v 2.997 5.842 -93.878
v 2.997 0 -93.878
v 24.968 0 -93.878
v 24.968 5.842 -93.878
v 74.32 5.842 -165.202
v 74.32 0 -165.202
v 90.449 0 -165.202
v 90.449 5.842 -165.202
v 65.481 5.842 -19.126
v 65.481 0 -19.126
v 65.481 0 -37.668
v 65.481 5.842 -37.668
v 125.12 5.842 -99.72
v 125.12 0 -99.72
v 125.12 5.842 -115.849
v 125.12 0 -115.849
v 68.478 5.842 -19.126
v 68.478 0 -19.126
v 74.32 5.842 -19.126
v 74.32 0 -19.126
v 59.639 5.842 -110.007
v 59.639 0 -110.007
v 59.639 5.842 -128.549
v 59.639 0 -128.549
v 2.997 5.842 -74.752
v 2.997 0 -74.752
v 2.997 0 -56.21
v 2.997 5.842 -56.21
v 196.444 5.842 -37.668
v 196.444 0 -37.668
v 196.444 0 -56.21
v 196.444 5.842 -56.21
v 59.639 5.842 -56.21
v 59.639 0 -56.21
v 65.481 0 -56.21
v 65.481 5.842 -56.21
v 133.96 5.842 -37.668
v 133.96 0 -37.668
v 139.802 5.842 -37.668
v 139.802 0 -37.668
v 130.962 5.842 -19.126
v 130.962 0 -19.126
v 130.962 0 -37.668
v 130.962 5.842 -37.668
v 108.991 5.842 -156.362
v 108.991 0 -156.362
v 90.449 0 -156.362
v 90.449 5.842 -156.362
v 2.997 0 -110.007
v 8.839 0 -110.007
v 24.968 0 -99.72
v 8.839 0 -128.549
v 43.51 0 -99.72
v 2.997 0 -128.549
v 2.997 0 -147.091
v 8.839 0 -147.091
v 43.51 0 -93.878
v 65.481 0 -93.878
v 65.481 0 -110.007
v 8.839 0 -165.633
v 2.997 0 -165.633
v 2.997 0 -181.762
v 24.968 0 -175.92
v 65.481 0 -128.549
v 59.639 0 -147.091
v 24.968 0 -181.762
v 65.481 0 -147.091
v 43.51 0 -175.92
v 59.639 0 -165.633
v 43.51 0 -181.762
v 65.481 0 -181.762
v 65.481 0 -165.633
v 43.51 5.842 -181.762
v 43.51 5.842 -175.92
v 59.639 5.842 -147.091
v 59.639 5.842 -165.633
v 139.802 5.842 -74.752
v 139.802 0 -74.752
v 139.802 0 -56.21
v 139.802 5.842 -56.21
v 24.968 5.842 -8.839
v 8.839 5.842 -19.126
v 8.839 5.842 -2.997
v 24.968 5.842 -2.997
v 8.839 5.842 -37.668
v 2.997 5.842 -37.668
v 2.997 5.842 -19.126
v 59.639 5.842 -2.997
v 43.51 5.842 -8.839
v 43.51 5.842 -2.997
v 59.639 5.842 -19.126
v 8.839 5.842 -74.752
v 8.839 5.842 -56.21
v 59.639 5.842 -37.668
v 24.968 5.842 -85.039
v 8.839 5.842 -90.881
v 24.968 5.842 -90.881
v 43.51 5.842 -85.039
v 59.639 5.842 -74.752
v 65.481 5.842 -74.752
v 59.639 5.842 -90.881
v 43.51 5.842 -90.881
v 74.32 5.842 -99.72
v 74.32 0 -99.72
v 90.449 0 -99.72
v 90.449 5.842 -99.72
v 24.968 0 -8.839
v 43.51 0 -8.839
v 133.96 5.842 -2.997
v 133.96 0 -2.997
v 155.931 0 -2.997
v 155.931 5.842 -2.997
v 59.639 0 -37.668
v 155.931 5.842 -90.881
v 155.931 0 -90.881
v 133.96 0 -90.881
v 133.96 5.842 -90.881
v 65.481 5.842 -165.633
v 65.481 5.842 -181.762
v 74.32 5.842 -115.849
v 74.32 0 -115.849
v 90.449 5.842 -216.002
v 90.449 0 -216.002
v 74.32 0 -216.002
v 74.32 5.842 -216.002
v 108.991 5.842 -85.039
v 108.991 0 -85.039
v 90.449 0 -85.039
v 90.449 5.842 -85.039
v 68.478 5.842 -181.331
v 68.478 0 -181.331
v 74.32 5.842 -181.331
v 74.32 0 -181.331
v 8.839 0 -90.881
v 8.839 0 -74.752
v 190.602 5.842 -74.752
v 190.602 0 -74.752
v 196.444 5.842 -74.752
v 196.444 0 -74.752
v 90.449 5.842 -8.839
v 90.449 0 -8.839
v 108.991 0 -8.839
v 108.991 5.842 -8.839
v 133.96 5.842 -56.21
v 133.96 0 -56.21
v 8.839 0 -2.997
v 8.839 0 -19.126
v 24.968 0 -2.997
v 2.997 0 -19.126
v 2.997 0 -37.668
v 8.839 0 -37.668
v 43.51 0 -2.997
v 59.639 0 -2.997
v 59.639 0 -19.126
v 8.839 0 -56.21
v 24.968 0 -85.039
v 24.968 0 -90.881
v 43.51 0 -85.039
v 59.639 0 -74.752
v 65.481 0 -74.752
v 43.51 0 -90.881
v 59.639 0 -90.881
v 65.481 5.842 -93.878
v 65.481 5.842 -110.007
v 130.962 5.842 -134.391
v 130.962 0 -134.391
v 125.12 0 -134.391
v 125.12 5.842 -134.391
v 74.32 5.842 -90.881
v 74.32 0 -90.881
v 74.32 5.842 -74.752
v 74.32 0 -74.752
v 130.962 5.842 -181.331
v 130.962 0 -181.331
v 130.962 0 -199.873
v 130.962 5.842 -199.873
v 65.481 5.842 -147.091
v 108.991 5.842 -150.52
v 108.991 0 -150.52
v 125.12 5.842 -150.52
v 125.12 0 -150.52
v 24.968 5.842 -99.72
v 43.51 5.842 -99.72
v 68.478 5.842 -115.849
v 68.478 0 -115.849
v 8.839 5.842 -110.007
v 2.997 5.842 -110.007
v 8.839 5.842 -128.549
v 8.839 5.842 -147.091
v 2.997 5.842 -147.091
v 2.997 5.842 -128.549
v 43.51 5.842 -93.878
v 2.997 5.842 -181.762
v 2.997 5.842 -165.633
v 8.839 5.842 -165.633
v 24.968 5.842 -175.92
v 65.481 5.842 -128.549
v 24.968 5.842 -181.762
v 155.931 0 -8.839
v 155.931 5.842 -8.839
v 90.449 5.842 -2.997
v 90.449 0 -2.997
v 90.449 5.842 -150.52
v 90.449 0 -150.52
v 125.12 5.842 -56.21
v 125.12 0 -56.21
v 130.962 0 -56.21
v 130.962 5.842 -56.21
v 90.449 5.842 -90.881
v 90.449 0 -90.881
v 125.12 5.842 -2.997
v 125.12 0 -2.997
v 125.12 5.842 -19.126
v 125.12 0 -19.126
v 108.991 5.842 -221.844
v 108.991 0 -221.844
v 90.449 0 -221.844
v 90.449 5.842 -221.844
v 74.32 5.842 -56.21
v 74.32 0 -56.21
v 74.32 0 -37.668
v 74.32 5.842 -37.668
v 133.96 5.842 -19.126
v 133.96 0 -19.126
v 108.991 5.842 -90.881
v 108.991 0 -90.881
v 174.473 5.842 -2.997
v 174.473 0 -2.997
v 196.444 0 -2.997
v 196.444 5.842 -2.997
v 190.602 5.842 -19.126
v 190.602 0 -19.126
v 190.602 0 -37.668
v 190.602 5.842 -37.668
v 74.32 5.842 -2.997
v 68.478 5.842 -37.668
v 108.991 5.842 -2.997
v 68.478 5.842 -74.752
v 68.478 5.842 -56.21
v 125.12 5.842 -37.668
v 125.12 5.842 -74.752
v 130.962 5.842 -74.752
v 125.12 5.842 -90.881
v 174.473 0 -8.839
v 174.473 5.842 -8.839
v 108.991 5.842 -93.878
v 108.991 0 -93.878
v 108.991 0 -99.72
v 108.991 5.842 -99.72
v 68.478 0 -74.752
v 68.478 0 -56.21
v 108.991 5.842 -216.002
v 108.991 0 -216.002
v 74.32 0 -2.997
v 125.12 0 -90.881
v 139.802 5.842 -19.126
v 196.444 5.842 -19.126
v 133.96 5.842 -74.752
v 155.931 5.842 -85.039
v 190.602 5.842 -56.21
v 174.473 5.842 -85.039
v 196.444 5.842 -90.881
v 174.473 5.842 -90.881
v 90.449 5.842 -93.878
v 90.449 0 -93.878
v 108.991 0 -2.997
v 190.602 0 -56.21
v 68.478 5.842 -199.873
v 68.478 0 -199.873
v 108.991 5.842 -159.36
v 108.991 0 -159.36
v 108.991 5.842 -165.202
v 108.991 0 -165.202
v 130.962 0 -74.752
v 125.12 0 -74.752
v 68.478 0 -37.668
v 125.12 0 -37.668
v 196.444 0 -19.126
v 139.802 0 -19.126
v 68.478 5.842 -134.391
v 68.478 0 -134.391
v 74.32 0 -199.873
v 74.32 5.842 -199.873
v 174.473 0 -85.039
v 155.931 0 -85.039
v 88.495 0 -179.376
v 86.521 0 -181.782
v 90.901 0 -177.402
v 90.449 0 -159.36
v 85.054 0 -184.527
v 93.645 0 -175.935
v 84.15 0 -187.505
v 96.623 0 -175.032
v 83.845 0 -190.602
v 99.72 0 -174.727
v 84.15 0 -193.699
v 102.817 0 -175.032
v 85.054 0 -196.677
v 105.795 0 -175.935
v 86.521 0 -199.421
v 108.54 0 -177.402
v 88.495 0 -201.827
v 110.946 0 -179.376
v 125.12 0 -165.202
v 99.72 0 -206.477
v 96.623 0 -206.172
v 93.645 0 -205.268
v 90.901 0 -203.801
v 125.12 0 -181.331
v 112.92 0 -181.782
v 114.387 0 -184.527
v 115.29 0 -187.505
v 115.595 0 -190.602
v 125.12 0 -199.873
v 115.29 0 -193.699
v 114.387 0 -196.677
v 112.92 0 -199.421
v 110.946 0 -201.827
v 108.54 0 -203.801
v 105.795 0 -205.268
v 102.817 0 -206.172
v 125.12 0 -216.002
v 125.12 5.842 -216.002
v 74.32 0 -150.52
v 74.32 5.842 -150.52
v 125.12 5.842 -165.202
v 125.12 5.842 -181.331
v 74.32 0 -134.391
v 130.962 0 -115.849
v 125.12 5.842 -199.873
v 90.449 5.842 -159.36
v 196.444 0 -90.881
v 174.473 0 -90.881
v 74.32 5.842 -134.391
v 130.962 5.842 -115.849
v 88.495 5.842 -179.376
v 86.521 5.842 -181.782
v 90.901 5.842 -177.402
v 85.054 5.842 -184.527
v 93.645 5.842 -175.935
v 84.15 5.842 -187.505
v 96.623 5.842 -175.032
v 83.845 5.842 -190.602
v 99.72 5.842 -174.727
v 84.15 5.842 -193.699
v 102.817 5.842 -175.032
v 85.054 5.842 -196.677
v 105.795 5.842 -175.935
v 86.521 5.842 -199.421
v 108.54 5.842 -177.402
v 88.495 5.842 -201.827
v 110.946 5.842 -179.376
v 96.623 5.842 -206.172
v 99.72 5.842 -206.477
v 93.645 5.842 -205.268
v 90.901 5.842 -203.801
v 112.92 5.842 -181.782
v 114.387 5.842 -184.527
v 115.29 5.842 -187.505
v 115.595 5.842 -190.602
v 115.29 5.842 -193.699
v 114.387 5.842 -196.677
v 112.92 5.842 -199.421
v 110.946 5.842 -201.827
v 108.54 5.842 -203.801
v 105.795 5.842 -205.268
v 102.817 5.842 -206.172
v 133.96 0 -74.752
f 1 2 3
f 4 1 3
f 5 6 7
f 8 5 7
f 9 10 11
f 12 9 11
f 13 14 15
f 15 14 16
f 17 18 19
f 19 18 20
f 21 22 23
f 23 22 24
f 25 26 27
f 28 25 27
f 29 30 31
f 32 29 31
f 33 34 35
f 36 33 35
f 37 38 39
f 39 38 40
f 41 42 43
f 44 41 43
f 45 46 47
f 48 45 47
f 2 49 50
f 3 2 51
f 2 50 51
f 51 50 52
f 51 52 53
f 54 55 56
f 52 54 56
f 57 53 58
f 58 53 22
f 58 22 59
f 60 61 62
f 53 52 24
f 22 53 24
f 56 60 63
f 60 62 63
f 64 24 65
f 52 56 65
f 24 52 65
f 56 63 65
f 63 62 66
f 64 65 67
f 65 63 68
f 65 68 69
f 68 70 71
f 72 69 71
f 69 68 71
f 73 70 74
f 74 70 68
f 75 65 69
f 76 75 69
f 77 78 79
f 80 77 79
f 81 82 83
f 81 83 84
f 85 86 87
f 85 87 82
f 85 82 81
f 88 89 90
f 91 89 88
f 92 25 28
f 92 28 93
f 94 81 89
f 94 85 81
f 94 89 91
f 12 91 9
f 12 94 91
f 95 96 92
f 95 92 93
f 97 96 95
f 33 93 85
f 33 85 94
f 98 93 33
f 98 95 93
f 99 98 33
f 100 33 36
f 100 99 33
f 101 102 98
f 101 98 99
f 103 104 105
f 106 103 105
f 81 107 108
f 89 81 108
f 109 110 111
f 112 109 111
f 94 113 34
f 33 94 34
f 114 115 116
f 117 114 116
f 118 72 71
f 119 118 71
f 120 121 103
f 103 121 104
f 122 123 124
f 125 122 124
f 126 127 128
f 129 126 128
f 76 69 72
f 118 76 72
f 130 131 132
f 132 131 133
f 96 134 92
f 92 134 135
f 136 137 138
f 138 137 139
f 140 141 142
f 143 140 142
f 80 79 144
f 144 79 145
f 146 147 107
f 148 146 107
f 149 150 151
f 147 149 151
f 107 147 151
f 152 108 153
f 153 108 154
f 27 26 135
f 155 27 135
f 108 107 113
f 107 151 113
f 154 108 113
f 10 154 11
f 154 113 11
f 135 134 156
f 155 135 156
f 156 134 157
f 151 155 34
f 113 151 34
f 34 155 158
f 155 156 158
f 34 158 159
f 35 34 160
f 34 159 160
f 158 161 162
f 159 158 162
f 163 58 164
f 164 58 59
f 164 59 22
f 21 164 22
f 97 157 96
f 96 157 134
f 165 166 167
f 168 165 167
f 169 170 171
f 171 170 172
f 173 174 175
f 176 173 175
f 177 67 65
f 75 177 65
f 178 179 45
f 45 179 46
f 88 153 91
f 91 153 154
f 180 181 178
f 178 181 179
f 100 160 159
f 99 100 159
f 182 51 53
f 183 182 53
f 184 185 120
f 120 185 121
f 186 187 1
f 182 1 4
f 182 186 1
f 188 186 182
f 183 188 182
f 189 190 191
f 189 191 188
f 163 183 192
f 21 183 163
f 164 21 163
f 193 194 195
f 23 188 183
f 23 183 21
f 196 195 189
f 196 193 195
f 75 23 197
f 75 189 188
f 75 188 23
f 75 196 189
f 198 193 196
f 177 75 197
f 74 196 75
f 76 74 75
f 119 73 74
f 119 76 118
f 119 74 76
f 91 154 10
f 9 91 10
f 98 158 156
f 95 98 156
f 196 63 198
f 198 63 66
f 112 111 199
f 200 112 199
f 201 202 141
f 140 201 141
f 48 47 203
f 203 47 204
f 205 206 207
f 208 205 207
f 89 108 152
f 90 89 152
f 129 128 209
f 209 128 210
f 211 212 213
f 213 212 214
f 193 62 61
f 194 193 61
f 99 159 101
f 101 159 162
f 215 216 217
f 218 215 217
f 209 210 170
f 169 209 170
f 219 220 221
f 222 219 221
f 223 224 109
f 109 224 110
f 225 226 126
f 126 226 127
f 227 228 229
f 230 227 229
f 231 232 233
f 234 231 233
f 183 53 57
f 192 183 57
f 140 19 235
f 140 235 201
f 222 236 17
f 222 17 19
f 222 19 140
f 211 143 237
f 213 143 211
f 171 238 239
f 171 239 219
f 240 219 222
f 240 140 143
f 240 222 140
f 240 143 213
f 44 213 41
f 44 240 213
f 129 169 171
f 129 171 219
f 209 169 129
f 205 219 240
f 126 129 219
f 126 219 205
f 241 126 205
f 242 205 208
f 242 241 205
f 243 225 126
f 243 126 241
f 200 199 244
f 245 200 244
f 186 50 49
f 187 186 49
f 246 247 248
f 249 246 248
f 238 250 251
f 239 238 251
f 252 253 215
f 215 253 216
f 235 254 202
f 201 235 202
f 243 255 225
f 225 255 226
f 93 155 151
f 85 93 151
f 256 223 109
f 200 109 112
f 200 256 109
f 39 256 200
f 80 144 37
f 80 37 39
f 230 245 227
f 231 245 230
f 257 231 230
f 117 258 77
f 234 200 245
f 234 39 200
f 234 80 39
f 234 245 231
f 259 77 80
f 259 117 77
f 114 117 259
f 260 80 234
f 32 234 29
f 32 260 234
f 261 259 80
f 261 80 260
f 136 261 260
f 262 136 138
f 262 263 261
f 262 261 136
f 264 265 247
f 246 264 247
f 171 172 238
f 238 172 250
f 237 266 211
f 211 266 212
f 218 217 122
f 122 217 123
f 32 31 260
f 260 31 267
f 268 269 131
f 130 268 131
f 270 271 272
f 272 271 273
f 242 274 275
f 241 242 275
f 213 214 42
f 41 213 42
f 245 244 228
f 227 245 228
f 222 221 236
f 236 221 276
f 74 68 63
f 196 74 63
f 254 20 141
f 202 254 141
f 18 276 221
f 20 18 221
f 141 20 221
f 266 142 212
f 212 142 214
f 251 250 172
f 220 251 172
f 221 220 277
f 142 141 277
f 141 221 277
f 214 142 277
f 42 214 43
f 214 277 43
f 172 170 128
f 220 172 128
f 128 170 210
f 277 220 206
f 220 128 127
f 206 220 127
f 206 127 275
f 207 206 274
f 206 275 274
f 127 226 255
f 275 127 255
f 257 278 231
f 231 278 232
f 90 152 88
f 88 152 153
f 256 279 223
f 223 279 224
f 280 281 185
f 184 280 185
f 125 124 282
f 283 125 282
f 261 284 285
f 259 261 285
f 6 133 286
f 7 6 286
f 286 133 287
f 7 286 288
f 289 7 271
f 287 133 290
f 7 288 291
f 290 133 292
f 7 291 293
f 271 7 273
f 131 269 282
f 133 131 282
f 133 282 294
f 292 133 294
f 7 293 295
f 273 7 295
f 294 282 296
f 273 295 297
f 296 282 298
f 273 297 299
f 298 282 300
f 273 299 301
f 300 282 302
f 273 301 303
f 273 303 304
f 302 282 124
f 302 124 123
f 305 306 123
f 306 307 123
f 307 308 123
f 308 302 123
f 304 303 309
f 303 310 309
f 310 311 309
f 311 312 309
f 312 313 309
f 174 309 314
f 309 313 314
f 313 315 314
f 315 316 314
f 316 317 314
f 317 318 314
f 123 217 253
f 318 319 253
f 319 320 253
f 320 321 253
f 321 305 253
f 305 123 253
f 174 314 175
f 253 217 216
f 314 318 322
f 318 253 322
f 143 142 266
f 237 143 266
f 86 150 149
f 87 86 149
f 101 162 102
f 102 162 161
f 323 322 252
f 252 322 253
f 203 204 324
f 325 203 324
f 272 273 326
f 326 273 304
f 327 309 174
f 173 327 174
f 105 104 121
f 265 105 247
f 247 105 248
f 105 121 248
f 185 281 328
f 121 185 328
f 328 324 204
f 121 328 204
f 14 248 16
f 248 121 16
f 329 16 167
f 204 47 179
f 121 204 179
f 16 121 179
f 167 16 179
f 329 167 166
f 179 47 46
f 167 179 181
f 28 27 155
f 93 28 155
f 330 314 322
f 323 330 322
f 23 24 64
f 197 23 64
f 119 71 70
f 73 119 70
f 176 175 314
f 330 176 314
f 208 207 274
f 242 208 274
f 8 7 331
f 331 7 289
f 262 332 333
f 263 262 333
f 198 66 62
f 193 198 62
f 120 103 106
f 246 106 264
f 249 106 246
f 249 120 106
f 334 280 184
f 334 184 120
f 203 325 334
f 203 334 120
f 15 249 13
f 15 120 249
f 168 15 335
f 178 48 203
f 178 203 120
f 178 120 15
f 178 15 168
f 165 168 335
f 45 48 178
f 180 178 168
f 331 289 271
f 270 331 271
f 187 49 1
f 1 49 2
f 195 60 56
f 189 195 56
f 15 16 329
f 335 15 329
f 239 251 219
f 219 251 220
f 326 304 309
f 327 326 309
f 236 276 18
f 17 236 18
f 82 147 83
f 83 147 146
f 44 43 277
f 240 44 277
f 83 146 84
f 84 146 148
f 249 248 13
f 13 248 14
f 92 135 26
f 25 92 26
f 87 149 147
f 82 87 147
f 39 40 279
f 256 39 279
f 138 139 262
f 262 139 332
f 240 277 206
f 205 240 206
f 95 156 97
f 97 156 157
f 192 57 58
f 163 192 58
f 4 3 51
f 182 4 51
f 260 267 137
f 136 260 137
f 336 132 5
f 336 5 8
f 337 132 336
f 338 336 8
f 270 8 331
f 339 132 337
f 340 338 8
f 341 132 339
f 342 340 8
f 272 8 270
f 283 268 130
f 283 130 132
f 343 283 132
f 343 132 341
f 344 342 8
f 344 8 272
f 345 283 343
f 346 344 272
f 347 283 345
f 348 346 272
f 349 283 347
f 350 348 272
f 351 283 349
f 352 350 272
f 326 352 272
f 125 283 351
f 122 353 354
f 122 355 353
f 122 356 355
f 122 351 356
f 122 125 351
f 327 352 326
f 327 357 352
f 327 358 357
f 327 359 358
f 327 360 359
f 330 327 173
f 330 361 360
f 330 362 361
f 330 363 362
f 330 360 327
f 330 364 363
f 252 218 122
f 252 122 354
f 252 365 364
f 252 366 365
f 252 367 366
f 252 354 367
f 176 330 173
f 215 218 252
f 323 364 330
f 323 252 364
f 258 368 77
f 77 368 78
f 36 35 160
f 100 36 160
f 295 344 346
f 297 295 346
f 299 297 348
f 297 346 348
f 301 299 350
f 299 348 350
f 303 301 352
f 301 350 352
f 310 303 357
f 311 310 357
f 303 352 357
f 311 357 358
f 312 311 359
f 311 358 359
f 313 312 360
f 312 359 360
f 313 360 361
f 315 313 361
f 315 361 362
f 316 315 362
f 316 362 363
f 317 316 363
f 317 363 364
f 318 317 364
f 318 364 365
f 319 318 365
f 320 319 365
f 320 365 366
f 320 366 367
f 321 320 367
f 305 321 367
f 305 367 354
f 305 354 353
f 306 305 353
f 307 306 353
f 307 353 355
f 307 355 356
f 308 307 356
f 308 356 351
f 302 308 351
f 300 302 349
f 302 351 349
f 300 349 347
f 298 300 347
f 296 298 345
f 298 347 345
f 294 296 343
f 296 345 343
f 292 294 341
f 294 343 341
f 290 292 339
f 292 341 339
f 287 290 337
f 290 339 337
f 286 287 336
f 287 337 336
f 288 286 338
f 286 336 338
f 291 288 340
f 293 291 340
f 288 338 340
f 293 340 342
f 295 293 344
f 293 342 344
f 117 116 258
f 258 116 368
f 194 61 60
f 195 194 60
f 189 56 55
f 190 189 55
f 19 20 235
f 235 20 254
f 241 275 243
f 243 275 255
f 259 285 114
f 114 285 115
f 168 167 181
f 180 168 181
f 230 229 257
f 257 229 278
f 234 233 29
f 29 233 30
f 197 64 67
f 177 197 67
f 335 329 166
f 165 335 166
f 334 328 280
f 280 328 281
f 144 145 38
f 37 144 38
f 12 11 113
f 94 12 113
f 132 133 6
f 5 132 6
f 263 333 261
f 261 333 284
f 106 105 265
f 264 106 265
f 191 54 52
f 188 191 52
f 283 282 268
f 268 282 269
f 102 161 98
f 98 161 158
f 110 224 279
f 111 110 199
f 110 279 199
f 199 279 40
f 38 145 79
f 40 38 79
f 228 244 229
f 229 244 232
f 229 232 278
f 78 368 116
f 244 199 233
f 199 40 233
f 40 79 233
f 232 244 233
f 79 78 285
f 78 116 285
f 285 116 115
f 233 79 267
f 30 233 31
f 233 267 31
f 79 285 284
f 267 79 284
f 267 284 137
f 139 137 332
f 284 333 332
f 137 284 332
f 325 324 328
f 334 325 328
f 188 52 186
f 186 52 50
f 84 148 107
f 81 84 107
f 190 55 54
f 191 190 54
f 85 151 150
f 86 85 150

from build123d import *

# Parameters (mm, degrees)
BOSS_EXTRUDE1_DEPTH   = 5.842
BOSS_EXTRUDE1_2_DEPTH = 5.842
BOSS_EXTRUDE1_3_DEPTH = 5.842
BOSS_EXTRUDE1_4_DEPTH = 5.842
BOSS_EXTRUDE1_5_DEPTH = 5.842
BOSS_EXTRUDE1_6_DEPTH = 5.842
SKETCH5_R             = 15.875
CUT_EXTRUDE1_DEPTH    = 297.37611207


with BuildPart() as part:
    # Sketch4 → Boss-Extrude1 (new body)
    with BuildSketch(Plane(origin=(0, 0, 0), x_dir=(1, 0, 0), z_dir=(0, 1, 0))):
        Polygon((43.5102, 181.7624), (43.5102, 175.9204), (24.9682, 175.9204), (24.9682, 181.7624), (8.8392, 181.7624), (2.9972, 181.7624), (2.9972, 175.9204), (2.9972, 165.6334), (8.8392, 165.6334), (8.8392, 147.0914), (2.9972, 147.0914), (2.9972, 128.5494), (8.8392, 128.5494), (8.8392, 110.0074), (2.9972, 110.0074), (2.9972, 99.7204), (2.9972, 93.8784), (8.8392, 93.8784), (24.9682, 93.8784), (24.9682, 99.7204), (43.5102, 99.7204), (43.5102, 93.8784), (59.6392, 93.8784), (65.4812, 93.8784), (65.4812, 99.7204), (65.4812, 110.0074), (59.6392, 110.0074), (59.6392, 128.5494), (65.4812, 128.5494), (65.4812, 147.0914), (59.6392, 147.0914), (59.6392, 165.6334), (65.4812, 165.6334), (65.4812, 175.9204), (65.4812, 181.7624), (59.6392, 181.7624), align=None)
    extrude(amount=BOSS_EXTRUDE1_DEPTH)


with BuildPart() as body_2:
    # Sketch4 → Boss-Extrude1 2 (new body)
    with BuildSketch(Plane(origin=(0, 0, 0), x_dir=(1, 0, 0), z_dir=(0, 1, 0))):
        Polygon((90.4494, 221.8436), (90.4494, 216.0016), (74.3204, 216.0016), (74.3204, 199.8726), (68.4784, 199.8726), (68.4784, 181.3306), (74.3204, 181.3306), (74.3204, 165.2016), (90.4494, 165.2016), (90.4494, 159.3596), (108.9914, 159.3596), (108.9914, 165.2016), (125.1204, 165.2016), (125.1204, 181.3306), (130.9624, 181.3306), (130.9624, 199.8726), (125.1204, 199.8726), (125.1204, 216.0016), (108.9914, 216.0016), (108.9914, 221.8436), align=None)
    extrude(amount=BOSS_EXTRUDE1_2_DEPTH)

    # Sketch5 → Cut-Extrude1 (cut, through all)
    with BuildSketch(Plane(origin=(0, 5.842, 0), x_dir=(1, 0, 0), z_dir=(0, 1, 0))):
        with Locations((99.7204, 190.6016)):
            Circle(SKETCH5_R)
    extrude(amount=-CUT_EXTRUDE1_DEPTH, mode=Mode.SUBTRACT)


with BuildPart() as body_3:
    # Sketch4 → Boss-Extrude1 3 (new body)
    with BuildSketch(Plane(origin=(0, 0, 0), x_dir=(1, 0, 0), z_dir=(0, 1, 0))):
        Polygon((90.4494, 156.3624), (90.4494, 150.5204), (74.3204, 150.5204), (74.3204, 134.3914), (68.4784, 134.3914), (68.4784, 115.8494), (74.3204, 115.8494), (74.3204, 99.7204), (90.4494, 99.7204), (90.4494, 93.8784), (108.9914, 93.8784), (108.9914, 99.7204), (125.1204, 99.7204), (125.1204, 115.8494), (130.9624, 115.8494), (130.9624, 134.3914), (125.1204, 134.3914), (125.1204, 150.5204), (108.9914, 150.5204), (108.9914, 156.3624), align=None)
    extrude(amount=BOSS_EXTRUDE1_3_DEPTH)


with BuildPart() as body_4:
    # Sketch4 → Boss-Extrude1 4 (new body)
    with BuildSketch(Plane(origin=(0, 0, 0), x_dir=(1, 0, 0), z_dir=(0, 1, 0))):
        Polygon((43.5102, 90.8812), (43.5102, 85.0392), (24.9682, 85.0392), (24.9682, 90.8812), (8.8392, 90.8812), (8.8392, 85.0392), (8.8392, 74.7522), (2.9972, 74.7522), (2.9972, 56.2102), (8.8392, 56.2102), (8.8392, 37.6682), (2.9972, 37.6682), (2.9972, 19.1262), (8.8392, 19.1262), (8.8392, 8.8392), (8.8392, 2.9972), (24.9682, 2.9972), (24.9682, 8.8392), (43.5102, 8.8392), (43.5102, 2.9972), (59.6392, 2.9972), (59.6392, 8.8392), (59.6392, 19.1262), (65.4812, 19.1262), (65.4812, 37.6682), (59.6392, 37.6682), (59.6392, 56.2102), (65.4812, 56.2102), (65.4812, 74.7522), (59.6392, 74.7522), (59.6392, 85.0392), (59.6392, 90.8812), align=None)
    extrude(amount=BOSS_EXTRUDE1_4_DEPTH)


with BuildPart() as body_5:
    # Sketch4 → Boss-Extrude1 5 (new body)
    with BuildSketch(Plane(origin=(0, 0, 0), x_dir=(1, 0, 0), z_dir=(0, 1, 0))):
        Polygon((90.4494, 85.0392), (90.4494, 90.8812), (74.3204, 90.8812), (74.3204, 85.0392), (74.3204, 74.7522), (68.4784, 74.7522), (68.4784, 56.2102), (74.3204, 56.2102), (74.3204, 37.6682), (68.4784, 37.6682), (68.4784, 19.1262), (74.3204, 19.1262), (74.3204, 8.8392), (74.3204, 2.9972), (90.4494, 2.9972), (90.4494, 8.8392), (108.9914, 8.8392), (108.9914, 2.9972), (125.1204, 2.9972), (125.1204, 8.8392), (125.1204, 19.1262), (130.9624, 19.1262), (130.9624, 37.6682), (125.1204, 37.6682), (125.1204, 56.2102), (130.9624, 56.2102), (130.9624, 74.7522), (125.1204, 74.7522), (125.1204, 85.0392), (125.1204, 90.8812), (108.9914, 90.8812), (108.9914, 85.0392), align=None)
    extrude(amount=BOSS_EXTRUDE1_5_DEPTH)


with BuildPart() as body_6:
    # Sketch4 → Boss-Extrude1 6 (new body)
    with BuildSketch(Plane(origin=(0, 0, 0), x_dir=(1, 0, 0), z_dir=(0, 1, 0))):
        Polygon((155.9306, 85.0392), (155.9306, 90.8812), (139.8016, 90.8812), (133.9596, 90.8812), (133.9596, 85.0392), (133.9596, 74.7522), (139.8016, 74.7522), (139.8016, 56.2102), (133.9596, 56.2102), (133.9596, 37.6682), (139.8016, 37.6682), (139.8016, 19.1262), (133.9596, 19.1262), (133.9596, 8.8392), (133.9596, 2.9972), (139.8016, 2.9972), (155.9306, 2.9972), (155.9306, 8.8392), (174.4726, 8.8392), (174.4726, 2.9972), (190.6016, 2.9972), (196.4436, 2.9972), (196.4436, 8.8392), (196.4436, 19.1262), (190.6016, 19.1262), (190.6016, 37.6682), (196.4436, 37.6682), (196.4436, 56.2102), (190.6016, 56.2102), (190.6016, 74.7522), (196.4436, 74.7522), (196.4436, 85.0392), (196.4436, 90.8812), (190.6016, 90.8812), (174.4726, 90.8812), (174.4726, 85.0392), align=None)
    extrude(amount=BOSS_EXTRUDE1_6_DEPTH)


solid = Compound([part.part, body_2.part, body_3.part, body_4.part, body_5.part, body_6.part])
